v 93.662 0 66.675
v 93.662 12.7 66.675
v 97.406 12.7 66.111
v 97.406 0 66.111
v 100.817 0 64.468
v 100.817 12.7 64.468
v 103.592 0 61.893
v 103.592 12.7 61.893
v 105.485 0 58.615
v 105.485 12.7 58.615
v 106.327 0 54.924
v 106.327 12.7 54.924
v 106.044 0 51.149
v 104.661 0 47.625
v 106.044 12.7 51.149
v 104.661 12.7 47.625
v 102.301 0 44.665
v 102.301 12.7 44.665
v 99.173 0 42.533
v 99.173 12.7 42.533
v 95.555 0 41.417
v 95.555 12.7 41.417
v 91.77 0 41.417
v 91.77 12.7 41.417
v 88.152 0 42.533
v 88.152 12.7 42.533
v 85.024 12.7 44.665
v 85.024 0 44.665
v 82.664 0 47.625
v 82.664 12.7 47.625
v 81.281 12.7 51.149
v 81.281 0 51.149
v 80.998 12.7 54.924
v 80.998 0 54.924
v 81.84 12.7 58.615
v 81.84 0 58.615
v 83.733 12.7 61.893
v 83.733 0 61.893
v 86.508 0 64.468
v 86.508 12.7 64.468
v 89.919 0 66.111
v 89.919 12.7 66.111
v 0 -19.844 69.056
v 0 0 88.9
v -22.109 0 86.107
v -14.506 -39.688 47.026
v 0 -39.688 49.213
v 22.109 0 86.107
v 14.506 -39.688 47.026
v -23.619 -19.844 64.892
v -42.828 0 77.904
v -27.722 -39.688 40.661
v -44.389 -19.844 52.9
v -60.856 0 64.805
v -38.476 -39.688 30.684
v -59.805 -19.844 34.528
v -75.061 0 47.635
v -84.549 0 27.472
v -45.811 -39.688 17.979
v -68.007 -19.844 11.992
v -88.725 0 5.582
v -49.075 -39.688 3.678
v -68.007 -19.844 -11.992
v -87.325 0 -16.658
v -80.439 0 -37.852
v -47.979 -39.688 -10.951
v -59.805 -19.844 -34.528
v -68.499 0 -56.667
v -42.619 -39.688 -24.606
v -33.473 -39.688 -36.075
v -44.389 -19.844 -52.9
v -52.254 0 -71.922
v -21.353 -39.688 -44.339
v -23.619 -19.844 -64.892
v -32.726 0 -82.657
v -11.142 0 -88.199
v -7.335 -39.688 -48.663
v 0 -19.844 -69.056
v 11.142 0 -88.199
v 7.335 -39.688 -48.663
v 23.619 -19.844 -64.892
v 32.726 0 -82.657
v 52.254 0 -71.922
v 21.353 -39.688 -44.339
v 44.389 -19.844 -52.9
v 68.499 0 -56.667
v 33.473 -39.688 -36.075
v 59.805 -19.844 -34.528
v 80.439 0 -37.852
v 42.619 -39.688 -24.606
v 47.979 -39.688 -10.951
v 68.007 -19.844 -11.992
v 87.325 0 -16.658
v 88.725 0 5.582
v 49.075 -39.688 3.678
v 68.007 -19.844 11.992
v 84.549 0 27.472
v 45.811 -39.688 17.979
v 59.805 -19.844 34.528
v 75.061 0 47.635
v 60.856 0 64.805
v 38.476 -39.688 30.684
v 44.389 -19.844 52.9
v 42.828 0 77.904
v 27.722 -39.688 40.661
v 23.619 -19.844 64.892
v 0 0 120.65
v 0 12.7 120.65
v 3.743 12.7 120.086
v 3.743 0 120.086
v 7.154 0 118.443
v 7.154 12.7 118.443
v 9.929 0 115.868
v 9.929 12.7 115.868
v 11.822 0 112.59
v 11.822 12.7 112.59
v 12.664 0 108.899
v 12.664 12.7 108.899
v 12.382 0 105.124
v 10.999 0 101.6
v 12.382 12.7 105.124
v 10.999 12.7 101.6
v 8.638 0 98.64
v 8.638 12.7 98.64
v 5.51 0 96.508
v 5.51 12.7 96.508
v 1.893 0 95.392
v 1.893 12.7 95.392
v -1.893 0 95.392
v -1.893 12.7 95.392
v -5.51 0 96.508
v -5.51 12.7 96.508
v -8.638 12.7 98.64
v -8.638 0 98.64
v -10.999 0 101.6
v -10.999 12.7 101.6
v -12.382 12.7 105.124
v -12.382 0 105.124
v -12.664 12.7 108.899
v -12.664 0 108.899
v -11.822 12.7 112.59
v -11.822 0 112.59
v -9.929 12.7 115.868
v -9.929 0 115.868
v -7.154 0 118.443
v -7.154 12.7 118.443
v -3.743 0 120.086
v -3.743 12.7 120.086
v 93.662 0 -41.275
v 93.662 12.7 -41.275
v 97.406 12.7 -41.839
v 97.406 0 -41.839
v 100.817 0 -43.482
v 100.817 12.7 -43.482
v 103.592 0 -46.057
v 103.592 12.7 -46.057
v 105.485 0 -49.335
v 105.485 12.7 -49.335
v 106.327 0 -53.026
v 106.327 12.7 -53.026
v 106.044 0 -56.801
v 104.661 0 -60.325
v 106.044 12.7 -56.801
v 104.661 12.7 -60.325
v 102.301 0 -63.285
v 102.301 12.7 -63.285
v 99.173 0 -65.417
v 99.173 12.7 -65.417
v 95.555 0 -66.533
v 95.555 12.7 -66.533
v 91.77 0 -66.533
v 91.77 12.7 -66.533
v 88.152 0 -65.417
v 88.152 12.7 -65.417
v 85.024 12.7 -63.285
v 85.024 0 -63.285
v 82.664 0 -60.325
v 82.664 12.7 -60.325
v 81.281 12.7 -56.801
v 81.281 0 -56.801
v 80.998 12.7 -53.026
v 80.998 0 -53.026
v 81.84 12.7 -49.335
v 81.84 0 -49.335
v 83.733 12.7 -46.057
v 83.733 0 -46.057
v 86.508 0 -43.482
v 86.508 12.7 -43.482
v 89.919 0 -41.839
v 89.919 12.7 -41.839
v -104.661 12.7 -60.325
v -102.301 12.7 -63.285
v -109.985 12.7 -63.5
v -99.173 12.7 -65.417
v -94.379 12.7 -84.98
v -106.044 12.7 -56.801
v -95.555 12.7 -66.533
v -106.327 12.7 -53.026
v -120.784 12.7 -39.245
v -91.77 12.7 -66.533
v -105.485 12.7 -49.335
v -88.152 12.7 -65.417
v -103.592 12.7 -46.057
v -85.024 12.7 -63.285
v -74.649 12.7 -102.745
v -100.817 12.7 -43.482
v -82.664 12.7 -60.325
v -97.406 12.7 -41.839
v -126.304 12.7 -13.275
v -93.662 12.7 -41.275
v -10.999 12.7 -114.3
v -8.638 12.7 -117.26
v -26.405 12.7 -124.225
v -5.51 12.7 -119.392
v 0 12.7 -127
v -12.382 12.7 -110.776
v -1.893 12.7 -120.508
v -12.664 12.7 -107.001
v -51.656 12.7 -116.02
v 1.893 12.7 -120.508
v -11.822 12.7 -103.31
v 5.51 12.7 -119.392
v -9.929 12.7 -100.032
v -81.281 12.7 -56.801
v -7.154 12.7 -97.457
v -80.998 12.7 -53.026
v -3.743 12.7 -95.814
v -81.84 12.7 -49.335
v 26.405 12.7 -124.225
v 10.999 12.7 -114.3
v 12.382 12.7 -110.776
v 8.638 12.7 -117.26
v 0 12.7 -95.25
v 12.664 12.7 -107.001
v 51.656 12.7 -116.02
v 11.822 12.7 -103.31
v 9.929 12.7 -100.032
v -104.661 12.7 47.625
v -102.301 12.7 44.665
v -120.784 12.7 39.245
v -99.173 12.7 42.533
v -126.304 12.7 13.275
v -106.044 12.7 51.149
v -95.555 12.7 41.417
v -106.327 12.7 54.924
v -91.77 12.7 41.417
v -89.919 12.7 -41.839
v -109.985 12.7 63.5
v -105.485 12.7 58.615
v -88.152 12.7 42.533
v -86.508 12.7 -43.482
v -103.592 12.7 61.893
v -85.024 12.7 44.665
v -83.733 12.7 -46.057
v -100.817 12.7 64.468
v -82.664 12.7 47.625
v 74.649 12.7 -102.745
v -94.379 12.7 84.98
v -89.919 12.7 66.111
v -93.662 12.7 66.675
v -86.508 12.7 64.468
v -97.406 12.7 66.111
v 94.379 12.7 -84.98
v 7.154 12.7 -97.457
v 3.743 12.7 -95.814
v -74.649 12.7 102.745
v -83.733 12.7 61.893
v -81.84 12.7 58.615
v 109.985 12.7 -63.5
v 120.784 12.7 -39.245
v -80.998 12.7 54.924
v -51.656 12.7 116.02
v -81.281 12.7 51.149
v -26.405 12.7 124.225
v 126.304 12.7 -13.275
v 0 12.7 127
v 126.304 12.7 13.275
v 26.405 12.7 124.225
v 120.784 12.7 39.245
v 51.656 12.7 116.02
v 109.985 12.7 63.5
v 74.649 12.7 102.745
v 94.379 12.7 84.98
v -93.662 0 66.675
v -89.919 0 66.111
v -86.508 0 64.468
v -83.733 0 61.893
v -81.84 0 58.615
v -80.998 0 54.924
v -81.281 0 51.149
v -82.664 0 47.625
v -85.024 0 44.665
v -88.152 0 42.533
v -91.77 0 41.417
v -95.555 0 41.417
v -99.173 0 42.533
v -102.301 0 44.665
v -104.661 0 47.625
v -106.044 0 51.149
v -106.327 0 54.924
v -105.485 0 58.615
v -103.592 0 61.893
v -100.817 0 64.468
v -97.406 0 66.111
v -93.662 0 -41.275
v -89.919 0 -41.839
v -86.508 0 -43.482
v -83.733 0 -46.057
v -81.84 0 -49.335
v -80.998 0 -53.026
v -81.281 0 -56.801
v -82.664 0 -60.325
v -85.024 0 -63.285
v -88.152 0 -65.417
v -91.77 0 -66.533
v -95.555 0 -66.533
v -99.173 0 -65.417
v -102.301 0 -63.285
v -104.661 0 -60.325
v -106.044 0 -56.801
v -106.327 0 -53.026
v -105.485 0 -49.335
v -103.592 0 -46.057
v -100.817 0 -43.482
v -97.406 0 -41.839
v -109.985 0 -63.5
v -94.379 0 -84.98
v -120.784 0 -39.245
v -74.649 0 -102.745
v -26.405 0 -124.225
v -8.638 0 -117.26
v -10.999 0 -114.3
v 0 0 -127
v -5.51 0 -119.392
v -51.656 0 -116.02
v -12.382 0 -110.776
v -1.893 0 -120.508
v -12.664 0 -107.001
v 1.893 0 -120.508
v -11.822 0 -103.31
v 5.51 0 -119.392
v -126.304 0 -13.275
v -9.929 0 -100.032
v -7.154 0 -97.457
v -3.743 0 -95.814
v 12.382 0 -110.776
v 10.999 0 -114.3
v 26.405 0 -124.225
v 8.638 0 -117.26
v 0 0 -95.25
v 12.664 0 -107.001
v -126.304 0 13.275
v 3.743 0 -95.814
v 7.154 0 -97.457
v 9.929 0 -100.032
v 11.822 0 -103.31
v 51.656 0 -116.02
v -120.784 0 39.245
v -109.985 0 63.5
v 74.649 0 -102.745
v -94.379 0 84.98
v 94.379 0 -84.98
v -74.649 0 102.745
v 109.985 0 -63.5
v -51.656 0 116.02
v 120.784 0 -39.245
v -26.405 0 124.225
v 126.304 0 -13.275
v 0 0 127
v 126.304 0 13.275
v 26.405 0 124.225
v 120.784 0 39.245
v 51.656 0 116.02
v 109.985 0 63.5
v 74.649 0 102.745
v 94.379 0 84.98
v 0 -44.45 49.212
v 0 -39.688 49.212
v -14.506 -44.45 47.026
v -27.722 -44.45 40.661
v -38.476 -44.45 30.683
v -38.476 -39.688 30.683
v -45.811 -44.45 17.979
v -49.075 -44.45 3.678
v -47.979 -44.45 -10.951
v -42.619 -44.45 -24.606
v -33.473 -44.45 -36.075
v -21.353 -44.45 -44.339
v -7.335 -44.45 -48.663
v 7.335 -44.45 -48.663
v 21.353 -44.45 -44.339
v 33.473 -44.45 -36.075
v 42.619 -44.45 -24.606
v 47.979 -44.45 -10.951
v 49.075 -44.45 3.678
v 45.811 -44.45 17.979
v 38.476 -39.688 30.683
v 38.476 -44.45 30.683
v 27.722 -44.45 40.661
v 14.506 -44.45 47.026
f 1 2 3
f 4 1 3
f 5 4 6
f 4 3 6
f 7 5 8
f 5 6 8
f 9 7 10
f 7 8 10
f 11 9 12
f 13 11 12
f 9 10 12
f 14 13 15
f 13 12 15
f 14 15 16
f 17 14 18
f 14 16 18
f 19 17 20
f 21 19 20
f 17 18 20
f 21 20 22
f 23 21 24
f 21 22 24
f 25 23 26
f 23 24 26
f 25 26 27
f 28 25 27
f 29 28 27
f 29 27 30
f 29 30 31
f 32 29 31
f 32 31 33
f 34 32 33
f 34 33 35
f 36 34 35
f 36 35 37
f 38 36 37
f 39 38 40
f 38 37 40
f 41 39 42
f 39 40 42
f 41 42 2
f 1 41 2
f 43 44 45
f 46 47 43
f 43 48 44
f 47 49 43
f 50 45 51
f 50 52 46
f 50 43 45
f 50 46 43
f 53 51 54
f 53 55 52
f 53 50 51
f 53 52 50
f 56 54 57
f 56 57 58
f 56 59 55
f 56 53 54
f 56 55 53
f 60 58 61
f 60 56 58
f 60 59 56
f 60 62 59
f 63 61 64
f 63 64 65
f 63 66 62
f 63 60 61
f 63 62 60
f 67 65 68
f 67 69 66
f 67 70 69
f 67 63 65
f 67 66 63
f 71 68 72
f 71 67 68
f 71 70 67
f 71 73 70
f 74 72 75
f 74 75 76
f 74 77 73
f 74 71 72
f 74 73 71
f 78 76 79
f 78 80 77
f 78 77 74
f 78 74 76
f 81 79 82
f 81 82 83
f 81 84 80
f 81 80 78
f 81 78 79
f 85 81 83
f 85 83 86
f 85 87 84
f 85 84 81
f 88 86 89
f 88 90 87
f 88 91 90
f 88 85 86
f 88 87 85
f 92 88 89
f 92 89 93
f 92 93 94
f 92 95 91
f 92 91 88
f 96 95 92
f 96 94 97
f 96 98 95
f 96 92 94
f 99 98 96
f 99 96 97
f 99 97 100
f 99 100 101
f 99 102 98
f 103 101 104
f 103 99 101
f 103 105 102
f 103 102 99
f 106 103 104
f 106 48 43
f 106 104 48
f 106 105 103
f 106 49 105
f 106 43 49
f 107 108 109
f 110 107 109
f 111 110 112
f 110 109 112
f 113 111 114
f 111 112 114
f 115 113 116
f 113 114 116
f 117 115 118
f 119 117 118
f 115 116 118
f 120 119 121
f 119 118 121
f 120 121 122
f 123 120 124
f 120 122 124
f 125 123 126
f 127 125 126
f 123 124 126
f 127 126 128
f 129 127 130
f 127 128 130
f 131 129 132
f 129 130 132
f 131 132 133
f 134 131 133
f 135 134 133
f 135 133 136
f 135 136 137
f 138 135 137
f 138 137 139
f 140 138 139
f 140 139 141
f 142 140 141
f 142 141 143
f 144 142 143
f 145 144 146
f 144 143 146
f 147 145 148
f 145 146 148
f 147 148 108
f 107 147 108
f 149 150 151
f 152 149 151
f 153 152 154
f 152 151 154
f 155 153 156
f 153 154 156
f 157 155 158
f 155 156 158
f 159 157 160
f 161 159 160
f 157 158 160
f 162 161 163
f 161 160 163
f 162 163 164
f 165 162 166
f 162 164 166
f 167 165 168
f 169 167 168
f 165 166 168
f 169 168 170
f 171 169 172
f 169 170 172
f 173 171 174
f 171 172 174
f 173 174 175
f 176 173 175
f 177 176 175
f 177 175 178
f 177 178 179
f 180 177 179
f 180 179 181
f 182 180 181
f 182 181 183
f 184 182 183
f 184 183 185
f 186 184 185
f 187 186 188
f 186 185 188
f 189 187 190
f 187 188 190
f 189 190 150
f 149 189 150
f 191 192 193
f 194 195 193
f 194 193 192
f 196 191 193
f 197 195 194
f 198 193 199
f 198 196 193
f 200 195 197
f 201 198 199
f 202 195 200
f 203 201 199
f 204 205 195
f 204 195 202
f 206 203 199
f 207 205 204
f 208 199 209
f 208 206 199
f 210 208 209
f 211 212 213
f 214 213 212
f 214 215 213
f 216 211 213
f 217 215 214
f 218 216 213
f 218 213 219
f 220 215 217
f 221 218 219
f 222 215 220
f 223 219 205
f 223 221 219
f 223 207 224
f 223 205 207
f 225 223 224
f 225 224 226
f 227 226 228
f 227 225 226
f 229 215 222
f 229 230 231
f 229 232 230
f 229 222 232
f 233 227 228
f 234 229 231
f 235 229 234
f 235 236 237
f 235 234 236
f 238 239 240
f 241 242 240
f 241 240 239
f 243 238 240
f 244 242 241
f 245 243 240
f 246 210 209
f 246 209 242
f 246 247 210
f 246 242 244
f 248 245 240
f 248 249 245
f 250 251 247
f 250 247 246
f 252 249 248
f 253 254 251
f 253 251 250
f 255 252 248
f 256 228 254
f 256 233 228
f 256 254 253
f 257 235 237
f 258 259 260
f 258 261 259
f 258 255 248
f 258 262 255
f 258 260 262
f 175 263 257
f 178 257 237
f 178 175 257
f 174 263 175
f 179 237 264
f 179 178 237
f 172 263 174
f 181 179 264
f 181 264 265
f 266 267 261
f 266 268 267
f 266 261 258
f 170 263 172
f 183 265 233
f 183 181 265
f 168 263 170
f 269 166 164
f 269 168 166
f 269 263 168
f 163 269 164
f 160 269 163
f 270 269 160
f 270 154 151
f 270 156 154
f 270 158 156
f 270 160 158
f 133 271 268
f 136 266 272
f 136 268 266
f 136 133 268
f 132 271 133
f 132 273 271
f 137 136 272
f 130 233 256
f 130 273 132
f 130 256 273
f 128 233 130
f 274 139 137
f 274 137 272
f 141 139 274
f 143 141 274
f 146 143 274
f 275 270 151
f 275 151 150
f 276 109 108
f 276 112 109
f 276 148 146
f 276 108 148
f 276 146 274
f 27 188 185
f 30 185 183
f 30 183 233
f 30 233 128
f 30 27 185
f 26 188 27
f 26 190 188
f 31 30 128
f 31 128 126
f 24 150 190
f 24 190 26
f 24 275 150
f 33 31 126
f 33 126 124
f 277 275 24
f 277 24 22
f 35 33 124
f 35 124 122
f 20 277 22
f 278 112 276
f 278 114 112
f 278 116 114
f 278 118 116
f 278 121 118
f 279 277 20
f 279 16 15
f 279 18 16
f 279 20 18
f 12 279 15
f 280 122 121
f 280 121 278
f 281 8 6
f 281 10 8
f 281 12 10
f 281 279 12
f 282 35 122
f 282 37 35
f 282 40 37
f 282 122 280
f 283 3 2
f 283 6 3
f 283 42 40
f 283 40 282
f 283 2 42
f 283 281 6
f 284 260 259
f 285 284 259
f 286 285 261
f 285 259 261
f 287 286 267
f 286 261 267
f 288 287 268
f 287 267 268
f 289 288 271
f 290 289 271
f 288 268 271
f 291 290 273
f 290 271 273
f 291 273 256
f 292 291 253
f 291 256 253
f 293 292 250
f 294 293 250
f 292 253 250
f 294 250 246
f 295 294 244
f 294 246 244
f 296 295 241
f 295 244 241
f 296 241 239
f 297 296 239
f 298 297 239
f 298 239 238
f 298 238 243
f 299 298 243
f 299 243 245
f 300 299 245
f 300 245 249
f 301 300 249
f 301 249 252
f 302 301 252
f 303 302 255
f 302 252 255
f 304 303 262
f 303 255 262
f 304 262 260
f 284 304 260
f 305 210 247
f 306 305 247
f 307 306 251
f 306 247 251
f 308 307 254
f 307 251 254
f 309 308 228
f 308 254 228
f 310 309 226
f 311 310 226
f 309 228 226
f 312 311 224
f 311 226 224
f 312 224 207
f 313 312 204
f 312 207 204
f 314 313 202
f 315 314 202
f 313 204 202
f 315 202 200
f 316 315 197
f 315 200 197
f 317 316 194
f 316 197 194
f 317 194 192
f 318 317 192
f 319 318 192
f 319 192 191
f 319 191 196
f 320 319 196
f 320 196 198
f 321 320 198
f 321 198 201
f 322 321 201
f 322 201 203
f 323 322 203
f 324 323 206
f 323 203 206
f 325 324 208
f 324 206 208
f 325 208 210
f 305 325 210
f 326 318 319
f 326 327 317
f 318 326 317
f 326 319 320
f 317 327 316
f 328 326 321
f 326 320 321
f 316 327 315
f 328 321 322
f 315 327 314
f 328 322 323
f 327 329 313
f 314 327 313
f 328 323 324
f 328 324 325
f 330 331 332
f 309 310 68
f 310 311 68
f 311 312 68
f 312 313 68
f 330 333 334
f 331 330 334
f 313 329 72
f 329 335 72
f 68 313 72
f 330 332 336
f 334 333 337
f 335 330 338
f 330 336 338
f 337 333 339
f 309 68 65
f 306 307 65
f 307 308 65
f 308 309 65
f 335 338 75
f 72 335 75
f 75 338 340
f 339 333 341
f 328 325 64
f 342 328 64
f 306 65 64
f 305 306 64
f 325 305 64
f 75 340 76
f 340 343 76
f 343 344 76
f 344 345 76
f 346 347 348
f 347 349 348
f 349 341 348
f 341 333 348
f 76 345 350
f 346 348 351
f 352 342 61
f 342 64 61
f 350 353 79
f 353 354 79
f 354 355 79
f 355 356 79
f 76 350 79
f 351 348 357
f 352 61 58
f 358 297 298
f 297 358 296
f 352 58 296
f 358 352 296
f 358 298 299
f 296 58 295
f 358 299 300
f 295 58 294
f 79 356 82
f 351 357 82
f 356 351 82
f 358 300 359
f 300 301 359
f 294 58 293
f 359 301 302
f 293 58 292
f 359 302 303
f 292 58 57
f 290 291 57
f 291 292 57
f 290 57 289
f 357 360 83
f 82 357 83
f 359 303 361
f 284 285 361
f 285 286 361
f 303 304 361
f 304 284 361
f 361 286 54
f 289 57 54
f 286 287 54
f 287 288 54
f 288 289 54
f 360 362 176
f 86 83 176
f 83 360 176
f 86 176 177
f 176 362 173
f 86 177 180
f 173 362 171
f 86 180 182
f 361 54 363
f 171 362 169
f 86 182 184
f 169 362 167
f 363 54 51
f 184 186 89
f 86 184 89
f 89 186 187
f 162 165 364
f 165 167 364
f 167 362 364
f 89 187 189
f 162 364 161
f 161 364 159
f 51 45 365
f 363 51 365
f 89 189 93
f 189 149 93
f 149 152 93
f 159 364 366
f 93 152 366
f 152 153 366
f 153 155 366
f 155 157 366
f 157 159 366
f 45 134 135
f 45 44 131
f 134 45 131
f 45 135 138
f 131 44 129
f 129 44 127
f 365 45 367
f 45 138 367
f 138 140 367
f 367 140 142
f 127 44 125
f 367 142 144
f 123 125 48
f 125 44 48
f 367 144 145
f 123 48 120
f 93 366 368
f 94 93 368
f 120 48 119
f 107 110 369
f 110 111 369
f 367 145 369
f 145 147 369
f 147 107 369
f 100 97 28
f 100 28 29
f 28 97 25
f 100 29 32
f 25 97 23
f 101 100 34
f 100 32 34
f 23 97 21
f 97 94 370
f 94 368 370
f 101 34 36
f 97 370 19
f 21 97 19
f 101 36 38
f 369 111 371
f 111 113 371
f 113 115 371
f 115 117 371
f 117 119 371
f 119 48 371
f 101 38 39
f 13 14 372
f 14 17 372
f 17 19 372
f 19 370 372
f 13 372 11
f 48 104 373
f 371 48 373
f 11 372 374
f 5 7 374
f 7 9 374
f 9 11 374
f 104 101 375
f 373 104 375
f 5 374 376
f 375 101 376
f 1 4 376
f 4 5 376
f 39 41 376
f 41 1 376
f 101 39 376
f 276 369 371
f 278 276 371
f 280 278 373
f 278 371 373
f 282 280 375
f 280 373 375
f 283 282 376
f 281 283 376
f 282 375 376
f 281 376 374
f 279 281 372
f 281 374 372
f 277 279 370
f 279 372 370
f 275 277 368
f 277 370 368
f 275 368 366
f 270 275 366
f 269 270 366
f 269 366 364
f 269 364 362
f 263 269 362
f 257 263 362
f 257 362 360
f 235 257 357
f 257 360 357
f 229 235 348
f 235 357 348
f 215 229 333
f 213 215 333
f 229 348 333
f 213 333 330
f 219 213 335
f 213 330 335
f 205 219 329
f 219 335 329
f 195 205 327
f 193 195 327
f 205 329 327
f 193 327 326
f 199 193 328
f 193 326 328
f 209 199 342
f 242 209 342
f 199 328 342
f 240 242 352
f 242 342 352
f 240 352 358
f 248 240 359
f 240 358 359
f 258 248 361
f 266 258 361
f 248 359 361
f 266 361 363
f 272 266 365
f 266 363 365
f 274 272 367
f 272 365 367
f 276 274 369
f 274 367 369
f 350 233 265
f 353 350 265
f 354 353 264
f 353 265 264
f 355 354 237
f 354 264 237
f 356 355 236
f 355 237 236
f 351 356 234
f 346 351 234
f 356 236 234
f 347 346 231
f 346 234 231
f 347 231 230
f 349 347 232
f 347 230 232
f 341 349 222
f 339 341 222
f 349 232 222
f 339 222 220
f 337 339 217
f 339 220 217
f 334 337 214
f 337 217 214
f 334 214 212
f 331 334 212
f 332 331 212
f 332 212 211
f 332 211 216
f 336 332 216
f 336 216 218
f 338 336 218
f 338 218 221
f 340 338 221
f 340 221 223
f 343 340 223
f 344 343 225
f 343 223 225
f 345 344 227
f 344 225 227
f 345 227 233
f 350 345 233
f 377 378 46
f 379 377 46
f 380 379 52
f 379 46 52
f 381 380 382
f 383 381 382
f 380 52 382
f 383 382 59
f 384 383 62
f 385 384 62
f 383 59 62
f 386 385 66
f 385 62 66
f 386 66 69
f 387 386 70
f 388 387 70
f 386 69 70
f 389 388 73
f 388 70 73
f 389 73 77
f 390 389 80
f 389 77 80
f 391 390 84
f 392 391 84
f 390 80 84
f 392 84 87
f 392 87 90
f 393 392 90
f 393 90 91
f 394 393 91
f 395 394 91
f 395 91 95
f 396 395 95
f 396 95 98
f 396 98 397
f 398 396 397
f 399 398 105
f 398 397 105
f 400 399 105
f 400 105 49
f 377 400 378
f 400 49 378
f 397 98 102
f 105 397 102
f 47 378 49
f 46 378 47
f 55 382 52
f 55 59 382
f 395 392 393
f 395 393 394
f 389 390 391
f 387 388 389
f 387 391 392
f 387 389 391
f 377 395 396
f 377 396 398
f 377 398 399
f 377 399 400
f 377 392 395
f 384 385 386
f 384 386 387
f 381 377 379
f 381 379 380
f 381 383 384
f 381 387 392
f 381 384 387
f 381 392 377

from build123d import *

# Parameters (mm, degrees)
SKETCH1_R           = 127
BOSS_EXTRUDE1_DEPTH = 12.7
SKETCH2_R           = 12.7
CUT_EXTRUDE1_DEPTH  = 12.7
SKETCH3_R           = 88.9
BOSS_EXTRUDE2_DEPTH = 39.6875
CHAMFER2_SIZE       = 39.6875
SKETCH4_R           = 49.2125
BOSS_EXTRUDE3_DEPTH = 4.7625


with BuildPart() as part:
    # Sketch1 → Boss-Extrude1 (new body)
    with BuildSketch(Plane(origin=(0, 0, 0), x_dir=(1, 0, 0), z_dir=(0, 1, 0))):
        with Locations(Location((0, 0, 0), (0, 0, 270))):
            Circle(SKETCH1_R)
    extrude(amount=BOSS_EXTRUDE1_DEPTH)

    # Sketch2 → Cut-Extrude1 (cut)
    with BuildSketch(Plane(origin=(0, 12.7, 0), x_dir=(1, 0, 0), z_dir=(0, 1, 0))):
        with Locations(Location((0, 107.95, 0), (0, 0, 270))):
            Circle(SKETCH2_R)
        with Locations(Location((0, -107.95, 0), (0, 0, 270))):
            Circle(SKETCH2_R)
        with Locations(Location((93.6625, -53.975, 0), (0, 0, 270))):
            Circle(SKETCH2_R)
        with Locations(Location((93.6625, 53.975, 0), (0, 0, 270))):
            Circle(SKETCH2_R)
        with Locations(Location((-93.6625, 53.975, 0), (0, 0, 270))):
            Circle(SKETCH2_R)
        with Locations(Location((-93.6625, -53.975, 0), (0, 0, 270))):
            Circle(SKETCH2_R)
    extrude(amount=-CUT_EXTRUDE1_DEPTH, mode=Mode.SUBTRACT)

    # Sketch3 → Boss-Extrude2 (add)
    with BuildSketch(Plane(origin=(0, 0, 0), x_dir=(-1, 0, 0), z_dir=(0, -1, 0))):
        with Locations(Location((0, 0, 0), (0, 0, 270))):
            Circle(SKETCH3_R)
    extrude(amount=BOSS_EXTRUDE2_DEPTH)

    # Chamfer2
    chamfer2_edges = [part.edges().sort_by_distance(p)[0] for p in [
        (0, -39.6875, -88.9),
    ]]
    chamfer(chamfer2_edges, length=CHAMFER2_SIZE - 0.0001)  # a hair under: the kernel refuses the full size

    # Sketch4 → Boss-Extrude3 (add)
    with BuildSketch(Plane.XZ.offset(39.6875)):
        with Locations(Location((0, 0, 0), (0, 0, 90))):
            Circle(SKETCH4_R)
    extrude(amount=BOSS_EXTRUDE3_DEPTH)


solid = part.part
